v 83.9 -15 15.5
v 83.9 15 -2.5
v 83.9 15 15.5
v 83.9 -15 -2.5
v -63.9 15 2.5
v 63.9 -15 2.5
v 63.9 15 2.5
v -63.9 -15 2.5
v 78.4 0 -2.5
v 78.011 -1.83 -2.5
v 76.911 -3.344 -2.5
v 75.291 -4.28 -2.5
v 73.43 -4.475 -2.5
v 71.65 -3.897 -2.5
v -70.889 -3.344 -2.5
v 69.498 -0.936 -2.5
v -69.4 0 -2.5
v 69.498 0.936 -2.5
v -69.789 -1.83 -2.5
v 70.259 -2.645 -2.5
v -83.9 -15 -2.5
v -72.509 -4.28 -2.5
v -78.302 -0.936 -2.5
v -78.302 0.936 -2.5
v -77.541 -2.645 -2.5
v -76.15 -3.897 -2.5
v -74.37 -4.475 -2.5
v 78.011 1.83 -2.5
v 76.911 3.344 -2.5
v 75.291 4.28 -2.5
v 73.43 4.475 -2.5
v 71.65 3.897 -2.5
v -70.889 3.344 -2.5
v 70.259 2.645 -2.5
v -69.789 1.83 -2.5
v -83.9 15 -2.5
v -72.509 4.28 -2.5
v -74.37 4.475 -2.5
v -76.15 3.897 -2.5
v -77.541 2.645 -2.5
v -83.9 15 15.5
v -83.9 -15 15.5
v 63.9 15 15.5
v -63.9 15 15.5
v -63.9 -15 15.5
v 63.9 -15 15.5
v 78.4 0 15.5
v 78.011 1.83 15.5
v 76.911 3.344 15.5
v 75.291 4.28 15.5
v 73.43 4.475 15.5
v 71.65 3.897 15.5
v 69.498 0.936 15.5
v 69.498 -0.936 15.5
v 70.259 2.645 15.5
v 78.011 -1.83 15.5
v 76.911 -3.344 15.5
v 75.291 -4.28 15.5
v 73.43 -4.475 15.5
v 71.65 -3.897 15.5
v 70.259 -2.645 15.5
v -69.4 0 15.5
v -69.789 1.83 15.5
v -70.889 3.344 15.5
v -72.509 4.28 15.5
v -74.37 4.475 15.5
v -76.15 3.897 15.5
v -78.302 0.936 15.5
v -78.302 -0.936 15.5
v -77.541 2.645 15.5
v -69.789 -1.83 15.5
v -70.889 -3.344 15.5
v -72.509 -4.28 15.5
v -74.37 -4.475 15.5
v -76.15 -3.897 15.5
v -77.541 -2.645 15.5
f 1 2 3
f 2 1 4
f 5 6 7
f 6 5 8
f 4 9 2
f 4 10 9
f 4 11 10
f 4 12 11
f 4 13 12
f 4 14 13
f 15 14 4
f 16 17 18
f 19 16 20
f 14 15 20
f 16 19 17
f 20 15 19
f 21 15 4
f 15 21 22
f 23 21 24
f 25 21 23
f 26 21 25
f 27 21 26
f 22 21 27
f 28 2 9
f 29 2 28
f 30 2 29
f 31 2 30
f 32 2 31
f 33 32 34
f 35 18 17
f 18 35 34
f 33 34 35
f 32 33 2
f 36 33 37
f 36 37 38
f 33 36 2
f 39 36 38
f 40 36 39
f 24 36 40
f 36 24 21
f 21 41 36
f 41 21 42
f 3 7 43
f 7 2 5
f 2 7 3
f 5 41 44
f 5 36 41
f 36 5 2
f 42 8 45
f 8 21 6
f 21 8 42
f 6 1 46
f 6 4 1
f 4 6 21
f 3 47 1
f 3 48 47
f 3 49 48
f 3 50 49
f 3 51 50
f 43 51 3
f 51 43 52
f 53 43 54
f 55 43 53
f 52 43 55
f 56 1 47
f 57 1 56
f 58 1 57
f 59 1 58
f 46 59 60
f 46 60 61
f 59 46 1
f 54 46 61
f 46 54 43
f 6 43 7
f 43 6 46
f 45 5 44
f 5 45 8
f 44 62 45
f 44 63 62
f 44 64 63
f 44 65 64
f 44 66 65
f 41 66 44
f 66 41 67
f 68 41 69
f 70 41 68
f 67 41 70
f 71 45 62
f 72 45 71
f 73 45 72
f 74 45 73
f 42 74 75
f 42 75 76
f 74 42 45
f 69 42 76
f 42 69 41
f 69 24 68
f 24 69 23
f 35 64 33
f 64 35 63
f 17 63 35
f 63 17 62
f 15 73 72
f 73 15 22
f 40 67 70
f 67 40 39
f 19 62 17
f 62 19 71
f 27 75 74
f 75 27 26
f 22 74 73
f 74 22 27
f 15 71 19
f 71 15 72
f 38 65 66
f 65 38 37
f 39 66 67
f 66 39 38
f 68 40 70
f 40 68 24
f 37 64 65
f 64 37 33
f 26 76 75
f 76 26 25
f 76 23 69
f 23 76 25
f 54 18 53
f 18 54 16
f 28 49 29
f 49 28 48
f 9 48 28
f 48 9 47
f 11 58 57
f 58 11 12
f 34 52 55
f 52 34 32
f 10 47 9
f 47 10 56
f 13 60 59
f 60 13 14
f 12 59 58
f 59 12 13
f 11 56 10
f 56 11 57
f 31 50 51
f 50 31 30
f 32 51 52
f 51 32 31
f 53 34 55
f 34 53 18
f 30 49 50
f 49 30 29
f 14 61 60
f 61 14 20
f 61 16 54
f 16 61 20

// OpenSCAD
difference(){
    
    //-- Pieza sin taladros
    union(){
        //-- Cuerpo
        color("blue")
        cube([167.8,30,5], center=true);
        
        //-- Torre derecha
        color("green")
        translate([167.8/2-20/2, 0, 13/2+5/2])
            cube([20,30,13],center=true);
        
        //-- Torre izquierda
        color("green")
        translate([-167.8/2+20/2, 0, 13/2+5/2])
            cube([20,30,13],center=true);
        
    }
    
    //-- Taladros
    #translate([-167.8/2+10, 0, 0])
        cylinder(r=9/2,h=50,center=true);
    
    #translate([167.8/2-10, 0, 0])
        cylinder(r=9/2,h=50,center=true);
    
}
